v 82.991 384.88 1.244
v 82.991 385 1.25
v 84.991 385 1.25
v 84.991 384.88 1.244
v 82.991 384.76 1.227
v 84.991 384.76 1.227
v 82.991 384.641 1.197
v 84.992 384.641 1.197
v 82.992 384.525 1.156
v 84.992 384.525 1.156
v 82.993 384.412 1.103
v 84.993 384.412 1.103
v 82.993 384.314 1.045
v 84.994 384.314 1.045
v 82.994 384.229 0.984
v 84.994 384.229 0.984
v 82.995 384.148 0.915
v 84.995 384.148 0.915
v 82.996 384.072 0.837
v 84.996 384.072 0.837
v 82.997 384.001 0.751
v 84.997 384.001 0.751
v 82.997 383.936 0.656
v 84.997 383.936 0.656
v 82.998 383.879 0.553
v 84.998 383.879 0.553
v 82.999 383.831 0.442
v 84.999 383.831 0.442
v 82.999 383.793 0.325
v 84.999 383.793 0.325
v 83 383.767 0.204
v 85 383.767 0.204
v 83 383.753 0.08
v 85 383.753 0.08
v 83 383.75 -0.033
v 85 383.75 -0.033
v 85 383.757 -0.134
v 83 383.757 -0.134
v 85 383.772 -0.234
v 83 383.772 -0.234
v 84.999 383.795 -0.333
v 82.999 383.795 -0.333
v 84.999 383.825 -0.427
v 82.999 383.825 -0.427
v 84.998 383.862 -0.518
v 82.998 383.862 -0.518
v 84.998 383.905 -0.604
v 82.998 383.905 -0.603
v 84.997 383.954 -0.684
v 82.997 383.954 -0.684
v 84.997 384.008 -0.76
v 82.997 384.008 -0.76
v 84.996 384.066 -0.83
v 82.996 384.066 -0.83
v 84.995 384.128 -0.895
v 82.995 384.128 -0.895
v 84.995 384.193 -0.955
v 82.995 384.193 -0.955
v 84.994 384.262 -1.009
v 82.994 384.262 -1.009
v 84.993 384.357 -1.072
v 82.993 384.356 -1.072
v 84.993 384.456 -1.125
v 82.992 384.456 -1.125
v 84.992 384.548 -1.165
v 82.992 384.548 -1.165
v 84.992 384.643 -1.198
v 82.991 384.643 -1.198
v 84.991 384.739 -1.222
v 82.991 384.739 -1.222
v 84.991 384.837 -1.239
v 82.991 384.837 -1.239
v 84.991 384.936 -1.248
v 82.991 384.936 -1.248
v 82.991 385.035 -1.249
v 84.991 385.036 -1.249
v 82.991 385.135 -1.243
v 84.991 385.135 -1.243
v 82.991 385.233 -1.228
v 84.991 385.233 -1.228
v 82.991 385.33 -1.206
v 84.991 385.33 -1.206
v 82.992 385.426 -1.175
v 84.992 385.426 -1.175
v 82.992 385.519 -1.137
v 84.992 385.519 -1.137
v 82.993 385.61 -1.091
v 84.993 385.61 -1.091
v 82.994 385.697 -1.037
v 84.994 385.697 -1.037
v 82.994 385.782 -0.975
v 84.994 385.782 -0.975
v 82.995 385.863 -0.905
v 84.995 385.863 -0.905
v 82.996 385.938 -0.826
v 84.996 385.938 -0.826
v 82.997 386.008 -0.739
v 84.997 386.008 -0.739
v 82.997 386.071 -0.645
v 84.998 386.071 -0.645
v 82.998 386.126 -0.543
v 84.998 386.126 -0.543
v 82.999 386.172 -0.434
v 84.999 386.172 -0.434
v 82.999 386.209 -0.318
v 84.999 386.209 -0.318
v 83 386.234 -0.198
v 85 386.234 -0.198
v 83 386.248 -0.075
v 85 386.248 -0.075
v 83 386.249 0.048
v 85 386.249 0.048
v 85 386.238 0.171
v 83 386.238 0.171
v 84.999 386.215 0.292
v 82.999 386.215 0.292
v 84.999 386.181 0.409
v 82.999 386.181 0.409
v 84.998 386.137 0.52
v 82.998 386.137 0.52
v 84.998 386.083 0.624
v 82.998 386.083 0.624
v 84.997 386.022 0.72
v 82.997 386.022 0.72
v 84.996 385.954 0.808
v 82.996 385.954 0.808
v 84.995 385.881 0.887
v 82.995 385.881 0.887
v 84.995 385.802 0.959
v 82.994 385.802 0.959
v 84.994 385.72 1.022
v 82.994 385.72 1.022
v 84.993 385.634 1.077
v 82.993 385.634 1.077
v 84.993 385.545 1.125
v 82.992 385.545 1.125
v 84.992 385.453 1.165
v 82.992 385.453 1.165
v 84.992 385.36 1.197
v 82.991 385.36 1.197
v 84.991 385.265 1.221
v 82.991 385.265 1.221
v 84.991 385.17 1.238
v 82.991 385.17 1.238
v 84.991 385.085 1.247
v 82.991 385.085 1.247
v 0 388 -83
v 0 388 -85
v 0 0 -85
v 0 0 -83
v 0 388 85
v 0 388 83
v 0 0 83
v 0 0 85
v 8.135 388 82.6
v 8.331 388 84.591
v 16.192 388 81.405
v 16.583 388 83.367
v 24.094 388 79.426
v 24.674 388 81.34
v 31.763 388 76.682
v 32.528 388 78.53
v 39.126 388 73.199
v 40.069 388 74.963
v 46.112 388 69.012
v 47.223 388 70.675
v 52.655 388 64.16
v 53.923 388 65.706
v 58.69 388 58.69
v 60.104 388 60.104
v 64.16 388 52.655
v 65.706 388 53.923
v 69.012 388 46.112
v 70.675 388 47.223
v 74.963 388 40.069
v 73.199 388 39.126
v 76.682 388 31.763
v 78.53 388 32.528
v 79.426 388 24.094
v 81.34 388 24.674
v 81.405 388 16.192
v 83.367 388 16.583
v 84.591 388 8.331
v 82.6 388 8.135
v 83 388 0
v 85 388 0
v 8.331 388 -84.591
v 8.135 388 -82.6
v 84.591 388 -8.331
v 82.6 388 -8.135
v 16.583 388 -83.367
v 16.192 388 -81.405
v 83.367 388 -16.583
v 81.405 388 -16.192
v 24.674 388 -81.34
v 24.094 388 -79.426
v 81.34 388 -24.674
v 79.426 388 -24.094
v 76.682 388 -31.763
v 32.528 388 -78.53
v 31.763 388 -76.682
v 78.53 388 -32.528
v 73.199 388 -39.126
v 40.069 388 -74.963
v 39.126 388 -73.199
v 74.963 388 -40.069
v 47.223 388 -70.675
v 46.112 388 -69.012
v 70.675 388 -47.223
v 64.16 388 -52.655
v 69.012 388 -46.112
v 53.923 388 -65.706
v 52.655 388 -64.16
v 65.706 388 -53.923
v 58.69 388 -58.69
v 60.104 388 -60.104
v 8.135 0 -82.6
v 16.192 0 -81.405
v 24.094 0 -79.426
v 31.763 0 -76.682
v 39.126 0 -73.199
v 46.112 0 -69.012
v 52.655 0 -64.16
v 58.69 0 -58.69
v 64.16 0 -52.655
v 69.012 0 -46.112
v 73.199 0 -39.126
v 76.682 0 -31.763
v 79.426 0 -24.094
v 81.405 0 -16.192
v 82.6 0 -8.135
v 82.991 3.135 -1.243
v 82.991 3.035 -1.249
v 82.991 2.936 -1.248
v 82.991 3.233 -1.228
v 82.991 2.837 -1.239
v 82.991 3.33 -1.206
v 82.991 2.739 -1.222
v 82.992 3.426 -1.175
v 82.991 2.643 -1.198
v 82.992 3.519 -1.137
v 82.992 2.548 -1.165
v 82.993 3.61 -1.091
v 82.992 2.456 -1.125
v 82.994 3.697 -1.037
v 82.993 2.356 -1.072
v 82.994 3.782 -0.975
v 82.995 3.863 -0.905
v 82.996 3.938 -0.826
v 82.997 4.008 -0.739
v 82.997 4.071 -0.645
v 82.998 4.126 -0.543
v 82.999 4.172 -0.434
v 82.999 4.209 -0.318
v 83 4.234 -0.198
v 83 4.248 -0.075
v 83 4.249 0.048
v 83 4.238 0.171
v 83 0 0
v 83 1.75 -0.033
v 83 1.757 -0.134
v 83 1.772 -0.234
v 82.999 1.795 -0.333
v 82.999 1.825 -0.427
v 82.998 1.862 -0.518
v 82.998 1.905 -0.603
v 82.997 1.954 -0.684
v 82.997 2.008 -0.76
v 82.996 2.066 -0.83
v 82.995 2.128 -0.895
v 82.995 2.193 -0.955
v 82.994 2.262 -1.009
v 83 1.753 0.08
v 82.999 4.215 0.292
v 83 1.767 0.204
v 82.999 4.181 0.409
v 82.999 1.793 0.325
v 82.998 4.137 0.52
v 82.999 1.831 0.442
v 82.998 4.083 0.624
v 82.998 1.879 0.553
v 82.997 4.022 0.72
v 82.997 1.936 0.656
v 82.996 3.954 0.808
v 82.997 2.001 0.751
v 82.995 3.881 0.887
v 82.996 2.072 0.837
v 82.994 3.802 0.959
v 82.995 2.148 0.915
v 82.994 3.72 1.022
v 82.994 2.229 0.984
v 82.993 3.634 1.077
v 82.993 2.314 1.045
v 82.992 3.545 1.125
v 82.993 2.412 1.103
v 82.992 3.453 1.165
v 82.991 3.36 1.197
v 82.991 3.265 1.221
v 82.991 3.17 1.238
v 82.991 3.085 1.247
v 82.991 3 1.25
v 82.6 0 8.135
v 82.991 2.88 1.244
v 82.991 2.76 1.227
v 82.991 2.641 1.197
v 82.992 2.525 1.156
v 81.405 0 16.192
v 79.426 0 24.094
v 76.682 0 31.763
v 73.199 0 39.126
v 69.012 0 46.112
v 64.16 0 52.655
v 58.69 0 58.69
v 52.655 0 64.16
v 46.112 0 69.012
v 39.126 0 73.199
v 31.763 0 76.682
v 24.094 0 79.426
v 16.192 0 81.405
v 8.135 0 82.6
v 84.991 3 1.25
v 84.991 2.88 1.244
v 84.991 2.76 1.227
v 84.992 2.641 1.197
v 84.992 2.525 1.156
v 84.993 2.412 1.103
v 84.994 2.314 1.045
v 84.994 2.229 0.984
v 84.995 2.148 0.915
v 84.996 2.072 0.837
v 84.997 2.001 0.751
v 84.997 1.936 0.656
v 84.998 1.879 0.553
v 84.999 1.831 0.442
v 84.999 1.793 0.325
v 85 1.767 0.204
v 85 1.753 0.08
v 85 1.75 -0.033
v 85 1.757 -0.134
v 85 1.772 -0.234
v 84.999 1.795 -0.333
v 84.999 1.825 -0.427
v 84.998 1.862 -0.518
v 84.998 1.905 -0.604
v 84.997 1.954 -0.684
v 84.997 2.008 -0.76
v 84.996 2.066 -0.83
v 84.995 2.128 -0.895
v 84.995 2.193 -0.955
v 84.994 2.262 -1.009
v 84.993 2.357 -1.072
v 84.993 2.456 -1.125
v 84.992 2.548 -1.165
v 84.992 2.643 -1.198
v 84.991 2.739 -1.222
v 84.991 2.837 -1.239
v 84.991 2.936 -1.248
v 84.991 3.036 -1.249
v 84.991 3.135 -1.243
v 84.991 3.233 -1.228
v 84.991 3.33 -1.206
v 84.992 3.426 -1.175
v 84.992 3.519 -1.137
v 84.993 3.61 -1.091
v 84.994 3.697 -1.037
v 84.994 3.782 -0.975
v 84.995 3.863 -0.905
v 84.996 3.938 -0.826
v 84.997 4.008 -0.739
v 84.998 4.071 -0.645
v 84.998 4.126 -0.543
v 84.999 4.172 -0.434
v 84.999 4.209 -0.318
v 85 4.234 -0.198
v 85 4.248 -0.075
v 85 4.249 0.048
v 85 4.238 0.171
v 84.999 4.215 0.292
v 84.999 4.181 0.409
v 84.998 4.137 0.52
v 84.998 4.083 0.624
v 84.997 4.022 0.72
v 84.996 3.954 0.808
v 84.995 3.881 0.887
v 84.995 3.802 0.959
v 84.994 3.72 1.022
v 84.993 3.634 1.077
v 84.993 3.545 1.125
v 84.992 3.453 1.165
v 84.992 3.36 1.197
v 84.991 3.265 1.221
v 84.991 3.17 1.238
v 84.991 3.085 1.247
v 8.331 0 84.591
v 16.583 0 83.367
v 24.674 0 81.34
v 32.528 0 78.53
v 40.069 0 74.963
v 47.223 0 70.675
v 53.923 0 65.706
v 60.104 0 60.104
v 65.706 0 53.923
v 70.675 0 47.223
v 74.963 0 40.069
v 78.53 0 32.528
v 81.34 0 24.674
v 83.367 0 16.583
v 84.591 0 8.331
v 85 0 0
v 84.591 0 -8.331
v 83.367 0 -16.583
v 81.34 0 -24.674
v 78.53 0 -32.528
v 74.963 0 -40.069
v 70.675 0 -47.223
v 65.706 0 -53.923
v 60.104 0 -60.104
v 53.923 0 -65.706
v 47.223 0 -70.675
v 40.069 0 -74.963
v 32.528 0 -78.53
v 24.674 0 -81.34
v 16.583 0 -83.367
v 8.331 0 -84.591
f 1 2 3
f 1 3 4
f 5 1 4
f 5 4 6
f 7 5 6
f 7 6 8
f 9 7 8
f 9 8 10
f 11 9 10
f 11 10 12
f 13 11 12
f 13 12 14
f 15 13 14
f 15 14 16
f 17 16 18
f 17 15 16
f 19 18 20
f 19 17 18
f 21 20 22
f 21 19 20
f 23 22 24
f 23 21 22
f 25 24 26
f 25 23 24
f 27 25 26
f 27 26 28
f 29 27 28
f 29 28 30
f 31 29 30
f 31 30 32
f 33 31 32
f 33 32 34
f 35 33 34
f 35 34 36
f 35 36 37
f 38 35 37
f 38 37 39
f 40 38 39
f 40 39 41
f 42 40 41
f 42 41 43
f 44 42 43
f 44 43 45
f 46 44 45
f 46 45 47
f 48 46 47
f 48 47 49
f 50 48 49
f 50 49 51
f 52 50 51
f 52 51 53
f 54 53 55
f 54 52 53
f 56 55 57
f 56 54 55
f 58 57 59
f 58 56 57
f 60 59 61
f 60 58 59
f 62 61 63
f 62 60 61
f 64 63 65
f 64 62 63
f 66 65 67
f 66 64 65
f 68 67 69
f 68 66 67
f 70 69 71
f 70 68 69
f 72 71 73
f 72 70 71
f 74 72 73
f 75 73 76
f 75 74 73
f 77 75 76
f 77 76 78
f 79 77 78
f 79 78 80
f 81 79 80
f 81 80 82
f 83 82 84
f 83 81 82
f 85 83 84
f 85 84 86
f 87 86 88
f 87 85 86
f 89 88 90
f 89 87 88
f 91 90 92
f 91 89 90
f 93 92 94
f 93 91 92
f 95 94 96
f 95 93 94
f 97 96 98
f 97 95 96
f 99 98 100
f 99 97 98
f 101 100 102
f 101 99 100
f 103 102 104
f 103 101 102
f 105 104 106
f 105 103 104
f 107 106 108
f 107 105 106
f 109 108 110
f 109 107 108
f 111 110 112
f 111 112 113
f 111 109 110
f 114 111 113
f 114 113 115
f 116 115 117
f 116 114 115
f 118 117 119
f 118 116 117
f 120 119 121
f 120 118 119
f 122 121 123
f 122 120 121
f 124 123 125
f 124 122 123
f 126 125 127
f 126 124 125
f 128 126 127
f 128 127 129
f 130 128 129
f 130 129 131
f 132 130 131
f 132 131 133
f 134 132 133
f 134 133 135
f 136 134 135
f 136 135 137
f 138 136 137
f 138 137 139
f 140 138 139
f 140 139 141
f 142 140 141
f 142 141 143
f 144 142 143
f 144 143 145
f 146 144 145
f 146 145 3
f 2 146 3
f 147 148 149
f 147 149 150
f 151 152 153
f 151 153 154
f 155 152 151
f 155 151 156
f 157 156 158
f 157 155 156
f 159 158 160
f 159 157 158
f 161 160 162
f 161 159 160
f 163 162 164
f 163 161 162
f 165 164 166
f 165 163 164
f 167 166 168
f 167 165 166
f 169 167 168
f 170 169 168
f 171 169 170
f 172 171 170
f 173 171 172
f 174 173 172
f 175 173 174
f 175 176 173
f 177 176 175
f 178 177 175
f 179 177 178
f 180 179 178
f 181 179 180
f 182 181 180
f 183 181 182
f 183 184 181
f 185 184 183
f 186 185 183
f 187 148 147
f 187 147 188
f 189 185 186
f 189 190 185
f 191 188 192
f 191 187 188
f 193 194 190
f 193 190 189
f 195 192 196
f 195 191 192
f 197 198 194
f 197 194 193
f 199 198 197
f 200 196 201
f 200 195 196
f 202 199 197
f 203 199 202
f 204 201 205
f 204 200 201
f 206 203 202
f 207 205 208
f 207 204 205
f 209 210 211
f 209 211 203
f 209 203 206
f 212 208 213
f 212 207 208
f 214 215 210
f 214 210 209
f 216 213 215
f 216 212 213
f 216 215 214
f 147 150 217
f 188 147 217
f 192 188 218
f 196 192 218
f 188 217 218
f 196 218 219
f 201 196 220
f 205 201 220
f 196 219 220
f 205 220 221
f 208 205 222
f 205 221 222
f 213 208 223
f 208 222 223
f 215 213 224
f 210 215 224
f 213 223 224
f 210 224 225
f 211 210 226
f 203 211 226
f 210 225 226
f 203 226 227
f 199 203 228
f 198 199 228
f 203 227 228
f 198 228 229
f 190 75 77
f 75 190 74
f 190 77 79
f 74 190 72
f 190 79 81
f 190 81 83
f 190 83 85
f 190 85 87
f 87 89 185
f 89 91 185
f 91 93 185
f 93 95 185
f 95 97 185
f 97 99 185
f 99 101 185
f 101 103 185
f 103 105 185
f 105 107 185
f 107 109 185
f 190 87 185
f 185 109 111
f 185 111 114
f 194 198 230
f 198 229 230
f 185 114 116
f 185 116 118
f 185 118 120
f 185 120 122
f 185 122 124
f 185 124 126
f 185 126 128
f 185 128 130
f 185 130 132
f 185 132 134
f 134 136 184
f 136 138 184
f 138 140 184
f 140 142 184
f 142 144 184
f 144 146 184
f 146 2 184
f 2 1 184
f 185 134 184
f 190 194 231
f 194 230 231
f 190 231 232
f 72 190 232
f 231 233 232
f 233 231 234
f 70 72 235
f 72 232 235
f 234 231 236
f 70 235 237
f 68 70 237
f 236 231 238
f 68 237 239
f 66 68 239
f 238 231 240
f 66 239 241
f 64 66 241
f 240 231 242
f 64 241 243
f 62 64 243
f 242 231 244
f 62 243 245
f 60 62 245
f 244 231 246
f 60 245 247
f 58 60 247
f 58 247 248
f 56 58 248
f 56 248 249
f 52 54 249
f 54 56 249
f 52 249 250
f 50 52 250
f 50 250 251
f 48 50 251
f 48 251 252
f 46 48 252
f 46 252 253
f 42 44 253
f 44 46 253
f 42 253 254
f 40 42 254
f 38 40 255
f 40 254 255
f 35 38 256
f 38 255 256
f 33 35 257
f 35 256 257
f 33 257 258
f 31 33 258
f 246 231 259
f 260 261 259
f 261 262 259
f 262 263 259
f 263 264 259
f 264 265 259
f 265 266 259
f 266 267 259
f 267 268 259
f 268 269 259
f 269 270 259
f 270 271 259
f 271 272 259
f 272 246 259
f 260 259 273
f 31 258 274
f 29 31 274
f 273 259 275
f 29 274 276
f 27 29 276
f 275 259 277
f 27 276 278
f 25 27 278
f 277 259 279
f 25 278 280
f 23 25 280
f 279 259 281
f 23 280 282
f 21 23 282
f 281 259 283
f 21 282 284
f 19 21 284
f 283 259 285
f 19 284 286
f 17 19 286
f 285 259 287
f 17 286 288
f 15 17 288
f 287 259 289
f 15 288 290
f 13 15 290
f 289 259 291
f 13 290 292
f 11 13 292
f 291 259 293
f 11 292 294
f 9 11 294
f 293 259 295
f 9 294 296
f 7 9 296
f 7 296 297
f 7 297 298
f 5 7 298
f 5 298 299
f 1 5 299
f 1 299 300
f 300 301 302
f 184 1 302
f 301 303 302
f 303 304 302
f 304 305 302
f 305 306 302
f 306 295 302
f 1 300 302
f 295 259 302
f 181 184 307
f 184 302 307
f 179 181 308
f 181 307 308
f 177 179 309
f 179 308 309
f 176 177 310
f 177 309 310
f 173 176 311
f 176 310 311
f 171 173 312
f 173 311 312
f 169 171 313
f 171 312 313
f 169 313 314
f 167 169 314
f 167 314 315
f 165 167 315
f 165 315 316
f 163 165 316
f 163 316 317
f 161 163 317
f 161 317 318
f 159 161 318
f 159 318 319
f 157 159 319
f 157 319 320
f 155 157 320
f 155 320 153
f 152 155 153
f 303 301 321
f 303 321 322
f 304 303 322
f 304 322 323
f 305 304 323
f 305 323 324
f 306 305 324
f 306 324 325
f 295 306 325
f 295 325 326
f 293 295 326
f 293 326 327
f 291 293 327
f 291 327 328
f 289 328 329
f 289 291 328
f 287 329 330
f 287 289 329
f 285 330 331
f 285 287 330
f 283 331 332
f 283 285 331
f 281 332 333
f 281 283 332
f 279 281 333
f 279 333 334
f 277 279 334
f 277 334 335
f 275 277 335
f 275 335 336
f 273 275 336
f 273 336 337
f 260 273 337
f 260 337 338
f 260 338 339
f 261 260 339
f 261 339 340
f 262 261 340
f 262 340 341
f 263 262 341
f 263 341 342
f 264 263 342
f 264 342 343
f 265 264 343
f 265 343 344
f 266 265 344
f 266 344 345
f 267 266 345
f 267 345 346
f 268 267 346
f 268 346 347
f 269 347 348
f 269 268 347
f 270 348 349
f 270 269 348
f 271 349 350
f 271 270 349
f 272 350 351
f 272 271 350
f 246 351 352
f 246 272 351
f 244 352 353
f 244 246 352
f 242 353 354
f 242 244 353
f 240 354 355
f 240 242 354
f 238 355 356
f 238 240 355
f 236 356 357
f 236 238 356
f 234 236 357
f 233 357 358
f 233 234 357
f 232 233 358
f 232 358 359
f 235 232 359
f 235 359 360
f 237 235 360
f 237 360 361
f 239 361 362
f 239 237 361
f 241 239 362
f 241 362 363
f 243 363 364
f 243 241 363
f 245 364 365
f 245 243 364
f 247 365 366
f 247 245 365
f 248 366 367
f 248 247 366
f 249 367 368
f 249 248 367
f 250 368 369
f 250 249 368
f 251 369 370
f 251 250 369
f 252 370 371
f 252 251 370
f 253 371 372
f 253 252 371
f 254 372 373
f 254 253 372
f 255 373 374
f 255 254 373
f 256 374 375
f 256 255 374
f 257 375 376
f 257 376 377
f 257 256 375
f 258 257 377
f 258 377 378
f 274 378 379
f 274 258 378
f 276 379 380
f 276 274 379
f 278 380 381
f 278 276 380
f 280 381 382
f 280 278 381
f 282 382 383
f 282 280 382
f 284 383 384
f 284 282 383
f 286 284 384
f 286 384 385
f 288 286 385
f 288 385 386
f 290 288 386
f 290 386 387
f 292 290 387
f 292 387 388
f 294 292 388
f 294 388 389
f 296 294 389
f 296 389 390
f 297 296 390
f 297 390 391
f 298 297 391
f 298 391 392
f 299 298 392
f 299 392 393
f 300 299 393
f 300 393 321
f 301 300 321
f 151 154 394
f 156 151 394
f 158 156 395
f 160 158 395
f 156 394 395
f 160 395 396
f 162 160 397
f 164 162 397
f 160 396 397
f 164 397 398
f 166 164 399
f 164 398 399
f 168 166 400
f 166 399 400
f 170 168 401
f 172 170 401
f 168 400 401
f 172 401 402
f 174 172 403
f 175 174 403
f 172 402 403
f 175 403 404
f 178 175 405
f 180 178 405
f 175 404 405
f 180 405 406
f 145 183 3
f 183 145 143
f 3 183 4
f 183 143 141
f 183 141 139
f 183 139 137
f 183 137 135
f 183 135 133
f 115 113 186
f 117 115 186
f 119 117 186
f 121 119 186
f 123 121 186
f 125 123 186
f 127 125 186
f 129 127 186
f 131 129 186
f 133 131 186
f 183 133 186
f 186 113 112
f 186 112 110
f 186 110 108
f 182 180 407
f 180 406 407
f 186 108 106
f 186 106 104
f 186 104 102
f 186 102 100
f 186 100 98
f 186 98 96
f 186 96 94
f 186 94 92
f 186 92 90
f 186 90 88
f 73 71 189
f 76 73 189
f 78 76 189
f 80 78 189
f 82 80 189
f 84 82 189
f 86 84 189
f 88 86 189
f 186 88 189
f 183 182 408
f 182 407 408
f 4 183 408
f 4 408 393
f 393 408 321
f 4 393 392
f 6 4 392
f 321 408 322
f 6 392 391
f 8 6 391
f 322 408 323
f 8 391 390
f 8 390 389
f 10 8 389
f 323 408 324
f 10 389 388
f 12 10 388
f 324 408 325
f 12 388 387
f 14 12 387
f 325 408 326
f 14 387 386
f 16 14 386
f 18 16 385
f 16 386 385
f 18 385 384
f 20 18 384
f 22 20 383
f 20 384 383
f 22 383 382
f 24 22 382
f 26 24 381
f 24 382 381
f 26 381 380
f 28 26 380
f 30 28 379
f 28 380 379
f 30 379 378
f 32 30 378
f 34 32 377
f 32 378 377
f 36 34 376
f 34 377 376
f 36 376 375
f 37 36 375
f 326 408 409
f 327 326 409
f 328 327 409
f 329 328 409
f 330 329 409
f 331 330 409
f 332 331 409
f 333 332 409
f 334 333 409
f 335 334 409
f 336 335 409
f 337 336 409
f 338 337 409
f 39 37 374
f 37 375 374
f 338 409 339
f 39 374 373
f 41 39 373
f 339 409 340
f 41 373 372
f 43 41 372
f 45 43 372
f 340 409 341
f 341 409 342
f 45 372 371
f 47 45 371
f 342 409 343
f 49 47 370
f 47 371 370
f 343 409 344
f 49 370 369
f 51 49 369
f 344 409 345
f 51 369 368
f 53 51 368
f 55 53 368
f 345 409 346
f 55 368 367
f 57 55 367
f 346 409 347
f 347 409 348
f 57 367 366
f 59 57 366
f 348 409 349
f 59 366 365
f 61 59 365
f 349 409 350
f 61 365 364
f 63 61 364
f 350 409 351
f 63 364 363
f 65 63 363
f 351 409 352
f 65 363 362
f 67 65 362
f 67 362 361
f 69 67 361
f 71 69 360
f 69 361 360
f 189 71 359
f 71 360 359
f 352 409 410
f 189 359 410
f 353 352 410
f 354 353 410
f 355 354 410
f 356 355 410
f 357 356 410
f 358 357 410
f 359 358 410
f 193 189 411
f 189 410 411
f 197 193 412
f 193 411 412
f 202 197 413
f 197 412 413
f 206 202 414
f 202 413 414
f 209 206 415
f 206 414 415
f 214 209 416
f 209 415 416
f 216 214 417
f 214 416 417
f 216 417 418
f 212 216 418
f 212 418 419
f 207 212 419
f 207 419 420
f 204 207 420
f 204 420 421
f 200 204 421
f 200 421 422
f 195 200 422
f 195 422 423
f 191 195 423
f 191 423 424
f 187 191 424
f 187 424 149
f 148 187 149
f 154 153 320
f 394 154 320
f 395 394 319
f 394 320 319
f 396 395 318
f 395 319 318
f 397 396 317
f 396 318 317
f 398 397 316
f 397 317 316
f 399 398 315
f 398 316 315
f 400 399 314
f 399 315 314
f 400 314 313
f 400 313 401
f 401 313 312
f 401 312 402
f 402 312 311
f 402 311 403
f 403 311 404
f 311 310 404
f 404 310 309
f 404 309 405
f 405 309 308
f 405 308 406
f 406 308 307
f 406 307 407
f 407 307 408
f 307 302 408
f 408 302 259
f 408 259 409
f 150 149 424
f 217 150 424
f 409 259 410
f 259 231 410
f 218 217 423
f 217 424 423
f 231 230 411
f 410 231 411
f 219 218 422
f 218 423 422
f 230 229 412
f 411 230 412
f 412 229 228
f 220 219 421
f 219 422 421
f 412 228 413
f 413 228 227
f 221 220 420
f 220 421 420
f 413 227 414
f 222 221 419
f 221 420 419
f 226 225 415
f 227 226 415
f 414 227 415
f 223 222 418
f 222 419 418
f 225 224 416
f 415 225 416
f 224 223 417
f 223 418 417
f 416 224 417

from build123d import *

# Parameters (mm, degrees)
BOSS_EXTRUDE1_DEPTH = 388
SKETCH2_R           = 1.25
CUT_EXTRUDE1_DEPTH  = 202


with BuildPart() as part:
    # Sketch1 → Boss-Extrude1 (new body)
    with BuildSketch(Plane(origin=(0, 0, 0), x_dir=(1, 0, 0), z_dir=(0, 1, 0))):
        with BuildLine():
            Line((0, 85), (0, 83))
            ThreePointArc((0, 83), (83, 0), (0, -83))
            Line((0, -83), (0, -85))
            ThreePointArc((0, -85), (85, 0), (0, 85))
        make_face()
    extrude(amount=BOSS_EXTRUDE1_DEPTH)

    # Sketch2 → Cut-Extrude1 (cut)
    with BuildSketch(Plane(origin=(0, 0, 0), x_dir=(0, 0, -1), z_dir=(1, 0, 0))):
        with Locations(Location((0, 385, 0), (0, 0, 180))):
            Circle(SKETCH2_R)
        with Locations(Location((0, 3, 0), (0, 0, 180))):
            Circle(SKETCH2_R)
    extrude(amount=CUT_EXTRUDE1_DEPTH, mode=Mode.SUBTRACT)


solid = part.part
